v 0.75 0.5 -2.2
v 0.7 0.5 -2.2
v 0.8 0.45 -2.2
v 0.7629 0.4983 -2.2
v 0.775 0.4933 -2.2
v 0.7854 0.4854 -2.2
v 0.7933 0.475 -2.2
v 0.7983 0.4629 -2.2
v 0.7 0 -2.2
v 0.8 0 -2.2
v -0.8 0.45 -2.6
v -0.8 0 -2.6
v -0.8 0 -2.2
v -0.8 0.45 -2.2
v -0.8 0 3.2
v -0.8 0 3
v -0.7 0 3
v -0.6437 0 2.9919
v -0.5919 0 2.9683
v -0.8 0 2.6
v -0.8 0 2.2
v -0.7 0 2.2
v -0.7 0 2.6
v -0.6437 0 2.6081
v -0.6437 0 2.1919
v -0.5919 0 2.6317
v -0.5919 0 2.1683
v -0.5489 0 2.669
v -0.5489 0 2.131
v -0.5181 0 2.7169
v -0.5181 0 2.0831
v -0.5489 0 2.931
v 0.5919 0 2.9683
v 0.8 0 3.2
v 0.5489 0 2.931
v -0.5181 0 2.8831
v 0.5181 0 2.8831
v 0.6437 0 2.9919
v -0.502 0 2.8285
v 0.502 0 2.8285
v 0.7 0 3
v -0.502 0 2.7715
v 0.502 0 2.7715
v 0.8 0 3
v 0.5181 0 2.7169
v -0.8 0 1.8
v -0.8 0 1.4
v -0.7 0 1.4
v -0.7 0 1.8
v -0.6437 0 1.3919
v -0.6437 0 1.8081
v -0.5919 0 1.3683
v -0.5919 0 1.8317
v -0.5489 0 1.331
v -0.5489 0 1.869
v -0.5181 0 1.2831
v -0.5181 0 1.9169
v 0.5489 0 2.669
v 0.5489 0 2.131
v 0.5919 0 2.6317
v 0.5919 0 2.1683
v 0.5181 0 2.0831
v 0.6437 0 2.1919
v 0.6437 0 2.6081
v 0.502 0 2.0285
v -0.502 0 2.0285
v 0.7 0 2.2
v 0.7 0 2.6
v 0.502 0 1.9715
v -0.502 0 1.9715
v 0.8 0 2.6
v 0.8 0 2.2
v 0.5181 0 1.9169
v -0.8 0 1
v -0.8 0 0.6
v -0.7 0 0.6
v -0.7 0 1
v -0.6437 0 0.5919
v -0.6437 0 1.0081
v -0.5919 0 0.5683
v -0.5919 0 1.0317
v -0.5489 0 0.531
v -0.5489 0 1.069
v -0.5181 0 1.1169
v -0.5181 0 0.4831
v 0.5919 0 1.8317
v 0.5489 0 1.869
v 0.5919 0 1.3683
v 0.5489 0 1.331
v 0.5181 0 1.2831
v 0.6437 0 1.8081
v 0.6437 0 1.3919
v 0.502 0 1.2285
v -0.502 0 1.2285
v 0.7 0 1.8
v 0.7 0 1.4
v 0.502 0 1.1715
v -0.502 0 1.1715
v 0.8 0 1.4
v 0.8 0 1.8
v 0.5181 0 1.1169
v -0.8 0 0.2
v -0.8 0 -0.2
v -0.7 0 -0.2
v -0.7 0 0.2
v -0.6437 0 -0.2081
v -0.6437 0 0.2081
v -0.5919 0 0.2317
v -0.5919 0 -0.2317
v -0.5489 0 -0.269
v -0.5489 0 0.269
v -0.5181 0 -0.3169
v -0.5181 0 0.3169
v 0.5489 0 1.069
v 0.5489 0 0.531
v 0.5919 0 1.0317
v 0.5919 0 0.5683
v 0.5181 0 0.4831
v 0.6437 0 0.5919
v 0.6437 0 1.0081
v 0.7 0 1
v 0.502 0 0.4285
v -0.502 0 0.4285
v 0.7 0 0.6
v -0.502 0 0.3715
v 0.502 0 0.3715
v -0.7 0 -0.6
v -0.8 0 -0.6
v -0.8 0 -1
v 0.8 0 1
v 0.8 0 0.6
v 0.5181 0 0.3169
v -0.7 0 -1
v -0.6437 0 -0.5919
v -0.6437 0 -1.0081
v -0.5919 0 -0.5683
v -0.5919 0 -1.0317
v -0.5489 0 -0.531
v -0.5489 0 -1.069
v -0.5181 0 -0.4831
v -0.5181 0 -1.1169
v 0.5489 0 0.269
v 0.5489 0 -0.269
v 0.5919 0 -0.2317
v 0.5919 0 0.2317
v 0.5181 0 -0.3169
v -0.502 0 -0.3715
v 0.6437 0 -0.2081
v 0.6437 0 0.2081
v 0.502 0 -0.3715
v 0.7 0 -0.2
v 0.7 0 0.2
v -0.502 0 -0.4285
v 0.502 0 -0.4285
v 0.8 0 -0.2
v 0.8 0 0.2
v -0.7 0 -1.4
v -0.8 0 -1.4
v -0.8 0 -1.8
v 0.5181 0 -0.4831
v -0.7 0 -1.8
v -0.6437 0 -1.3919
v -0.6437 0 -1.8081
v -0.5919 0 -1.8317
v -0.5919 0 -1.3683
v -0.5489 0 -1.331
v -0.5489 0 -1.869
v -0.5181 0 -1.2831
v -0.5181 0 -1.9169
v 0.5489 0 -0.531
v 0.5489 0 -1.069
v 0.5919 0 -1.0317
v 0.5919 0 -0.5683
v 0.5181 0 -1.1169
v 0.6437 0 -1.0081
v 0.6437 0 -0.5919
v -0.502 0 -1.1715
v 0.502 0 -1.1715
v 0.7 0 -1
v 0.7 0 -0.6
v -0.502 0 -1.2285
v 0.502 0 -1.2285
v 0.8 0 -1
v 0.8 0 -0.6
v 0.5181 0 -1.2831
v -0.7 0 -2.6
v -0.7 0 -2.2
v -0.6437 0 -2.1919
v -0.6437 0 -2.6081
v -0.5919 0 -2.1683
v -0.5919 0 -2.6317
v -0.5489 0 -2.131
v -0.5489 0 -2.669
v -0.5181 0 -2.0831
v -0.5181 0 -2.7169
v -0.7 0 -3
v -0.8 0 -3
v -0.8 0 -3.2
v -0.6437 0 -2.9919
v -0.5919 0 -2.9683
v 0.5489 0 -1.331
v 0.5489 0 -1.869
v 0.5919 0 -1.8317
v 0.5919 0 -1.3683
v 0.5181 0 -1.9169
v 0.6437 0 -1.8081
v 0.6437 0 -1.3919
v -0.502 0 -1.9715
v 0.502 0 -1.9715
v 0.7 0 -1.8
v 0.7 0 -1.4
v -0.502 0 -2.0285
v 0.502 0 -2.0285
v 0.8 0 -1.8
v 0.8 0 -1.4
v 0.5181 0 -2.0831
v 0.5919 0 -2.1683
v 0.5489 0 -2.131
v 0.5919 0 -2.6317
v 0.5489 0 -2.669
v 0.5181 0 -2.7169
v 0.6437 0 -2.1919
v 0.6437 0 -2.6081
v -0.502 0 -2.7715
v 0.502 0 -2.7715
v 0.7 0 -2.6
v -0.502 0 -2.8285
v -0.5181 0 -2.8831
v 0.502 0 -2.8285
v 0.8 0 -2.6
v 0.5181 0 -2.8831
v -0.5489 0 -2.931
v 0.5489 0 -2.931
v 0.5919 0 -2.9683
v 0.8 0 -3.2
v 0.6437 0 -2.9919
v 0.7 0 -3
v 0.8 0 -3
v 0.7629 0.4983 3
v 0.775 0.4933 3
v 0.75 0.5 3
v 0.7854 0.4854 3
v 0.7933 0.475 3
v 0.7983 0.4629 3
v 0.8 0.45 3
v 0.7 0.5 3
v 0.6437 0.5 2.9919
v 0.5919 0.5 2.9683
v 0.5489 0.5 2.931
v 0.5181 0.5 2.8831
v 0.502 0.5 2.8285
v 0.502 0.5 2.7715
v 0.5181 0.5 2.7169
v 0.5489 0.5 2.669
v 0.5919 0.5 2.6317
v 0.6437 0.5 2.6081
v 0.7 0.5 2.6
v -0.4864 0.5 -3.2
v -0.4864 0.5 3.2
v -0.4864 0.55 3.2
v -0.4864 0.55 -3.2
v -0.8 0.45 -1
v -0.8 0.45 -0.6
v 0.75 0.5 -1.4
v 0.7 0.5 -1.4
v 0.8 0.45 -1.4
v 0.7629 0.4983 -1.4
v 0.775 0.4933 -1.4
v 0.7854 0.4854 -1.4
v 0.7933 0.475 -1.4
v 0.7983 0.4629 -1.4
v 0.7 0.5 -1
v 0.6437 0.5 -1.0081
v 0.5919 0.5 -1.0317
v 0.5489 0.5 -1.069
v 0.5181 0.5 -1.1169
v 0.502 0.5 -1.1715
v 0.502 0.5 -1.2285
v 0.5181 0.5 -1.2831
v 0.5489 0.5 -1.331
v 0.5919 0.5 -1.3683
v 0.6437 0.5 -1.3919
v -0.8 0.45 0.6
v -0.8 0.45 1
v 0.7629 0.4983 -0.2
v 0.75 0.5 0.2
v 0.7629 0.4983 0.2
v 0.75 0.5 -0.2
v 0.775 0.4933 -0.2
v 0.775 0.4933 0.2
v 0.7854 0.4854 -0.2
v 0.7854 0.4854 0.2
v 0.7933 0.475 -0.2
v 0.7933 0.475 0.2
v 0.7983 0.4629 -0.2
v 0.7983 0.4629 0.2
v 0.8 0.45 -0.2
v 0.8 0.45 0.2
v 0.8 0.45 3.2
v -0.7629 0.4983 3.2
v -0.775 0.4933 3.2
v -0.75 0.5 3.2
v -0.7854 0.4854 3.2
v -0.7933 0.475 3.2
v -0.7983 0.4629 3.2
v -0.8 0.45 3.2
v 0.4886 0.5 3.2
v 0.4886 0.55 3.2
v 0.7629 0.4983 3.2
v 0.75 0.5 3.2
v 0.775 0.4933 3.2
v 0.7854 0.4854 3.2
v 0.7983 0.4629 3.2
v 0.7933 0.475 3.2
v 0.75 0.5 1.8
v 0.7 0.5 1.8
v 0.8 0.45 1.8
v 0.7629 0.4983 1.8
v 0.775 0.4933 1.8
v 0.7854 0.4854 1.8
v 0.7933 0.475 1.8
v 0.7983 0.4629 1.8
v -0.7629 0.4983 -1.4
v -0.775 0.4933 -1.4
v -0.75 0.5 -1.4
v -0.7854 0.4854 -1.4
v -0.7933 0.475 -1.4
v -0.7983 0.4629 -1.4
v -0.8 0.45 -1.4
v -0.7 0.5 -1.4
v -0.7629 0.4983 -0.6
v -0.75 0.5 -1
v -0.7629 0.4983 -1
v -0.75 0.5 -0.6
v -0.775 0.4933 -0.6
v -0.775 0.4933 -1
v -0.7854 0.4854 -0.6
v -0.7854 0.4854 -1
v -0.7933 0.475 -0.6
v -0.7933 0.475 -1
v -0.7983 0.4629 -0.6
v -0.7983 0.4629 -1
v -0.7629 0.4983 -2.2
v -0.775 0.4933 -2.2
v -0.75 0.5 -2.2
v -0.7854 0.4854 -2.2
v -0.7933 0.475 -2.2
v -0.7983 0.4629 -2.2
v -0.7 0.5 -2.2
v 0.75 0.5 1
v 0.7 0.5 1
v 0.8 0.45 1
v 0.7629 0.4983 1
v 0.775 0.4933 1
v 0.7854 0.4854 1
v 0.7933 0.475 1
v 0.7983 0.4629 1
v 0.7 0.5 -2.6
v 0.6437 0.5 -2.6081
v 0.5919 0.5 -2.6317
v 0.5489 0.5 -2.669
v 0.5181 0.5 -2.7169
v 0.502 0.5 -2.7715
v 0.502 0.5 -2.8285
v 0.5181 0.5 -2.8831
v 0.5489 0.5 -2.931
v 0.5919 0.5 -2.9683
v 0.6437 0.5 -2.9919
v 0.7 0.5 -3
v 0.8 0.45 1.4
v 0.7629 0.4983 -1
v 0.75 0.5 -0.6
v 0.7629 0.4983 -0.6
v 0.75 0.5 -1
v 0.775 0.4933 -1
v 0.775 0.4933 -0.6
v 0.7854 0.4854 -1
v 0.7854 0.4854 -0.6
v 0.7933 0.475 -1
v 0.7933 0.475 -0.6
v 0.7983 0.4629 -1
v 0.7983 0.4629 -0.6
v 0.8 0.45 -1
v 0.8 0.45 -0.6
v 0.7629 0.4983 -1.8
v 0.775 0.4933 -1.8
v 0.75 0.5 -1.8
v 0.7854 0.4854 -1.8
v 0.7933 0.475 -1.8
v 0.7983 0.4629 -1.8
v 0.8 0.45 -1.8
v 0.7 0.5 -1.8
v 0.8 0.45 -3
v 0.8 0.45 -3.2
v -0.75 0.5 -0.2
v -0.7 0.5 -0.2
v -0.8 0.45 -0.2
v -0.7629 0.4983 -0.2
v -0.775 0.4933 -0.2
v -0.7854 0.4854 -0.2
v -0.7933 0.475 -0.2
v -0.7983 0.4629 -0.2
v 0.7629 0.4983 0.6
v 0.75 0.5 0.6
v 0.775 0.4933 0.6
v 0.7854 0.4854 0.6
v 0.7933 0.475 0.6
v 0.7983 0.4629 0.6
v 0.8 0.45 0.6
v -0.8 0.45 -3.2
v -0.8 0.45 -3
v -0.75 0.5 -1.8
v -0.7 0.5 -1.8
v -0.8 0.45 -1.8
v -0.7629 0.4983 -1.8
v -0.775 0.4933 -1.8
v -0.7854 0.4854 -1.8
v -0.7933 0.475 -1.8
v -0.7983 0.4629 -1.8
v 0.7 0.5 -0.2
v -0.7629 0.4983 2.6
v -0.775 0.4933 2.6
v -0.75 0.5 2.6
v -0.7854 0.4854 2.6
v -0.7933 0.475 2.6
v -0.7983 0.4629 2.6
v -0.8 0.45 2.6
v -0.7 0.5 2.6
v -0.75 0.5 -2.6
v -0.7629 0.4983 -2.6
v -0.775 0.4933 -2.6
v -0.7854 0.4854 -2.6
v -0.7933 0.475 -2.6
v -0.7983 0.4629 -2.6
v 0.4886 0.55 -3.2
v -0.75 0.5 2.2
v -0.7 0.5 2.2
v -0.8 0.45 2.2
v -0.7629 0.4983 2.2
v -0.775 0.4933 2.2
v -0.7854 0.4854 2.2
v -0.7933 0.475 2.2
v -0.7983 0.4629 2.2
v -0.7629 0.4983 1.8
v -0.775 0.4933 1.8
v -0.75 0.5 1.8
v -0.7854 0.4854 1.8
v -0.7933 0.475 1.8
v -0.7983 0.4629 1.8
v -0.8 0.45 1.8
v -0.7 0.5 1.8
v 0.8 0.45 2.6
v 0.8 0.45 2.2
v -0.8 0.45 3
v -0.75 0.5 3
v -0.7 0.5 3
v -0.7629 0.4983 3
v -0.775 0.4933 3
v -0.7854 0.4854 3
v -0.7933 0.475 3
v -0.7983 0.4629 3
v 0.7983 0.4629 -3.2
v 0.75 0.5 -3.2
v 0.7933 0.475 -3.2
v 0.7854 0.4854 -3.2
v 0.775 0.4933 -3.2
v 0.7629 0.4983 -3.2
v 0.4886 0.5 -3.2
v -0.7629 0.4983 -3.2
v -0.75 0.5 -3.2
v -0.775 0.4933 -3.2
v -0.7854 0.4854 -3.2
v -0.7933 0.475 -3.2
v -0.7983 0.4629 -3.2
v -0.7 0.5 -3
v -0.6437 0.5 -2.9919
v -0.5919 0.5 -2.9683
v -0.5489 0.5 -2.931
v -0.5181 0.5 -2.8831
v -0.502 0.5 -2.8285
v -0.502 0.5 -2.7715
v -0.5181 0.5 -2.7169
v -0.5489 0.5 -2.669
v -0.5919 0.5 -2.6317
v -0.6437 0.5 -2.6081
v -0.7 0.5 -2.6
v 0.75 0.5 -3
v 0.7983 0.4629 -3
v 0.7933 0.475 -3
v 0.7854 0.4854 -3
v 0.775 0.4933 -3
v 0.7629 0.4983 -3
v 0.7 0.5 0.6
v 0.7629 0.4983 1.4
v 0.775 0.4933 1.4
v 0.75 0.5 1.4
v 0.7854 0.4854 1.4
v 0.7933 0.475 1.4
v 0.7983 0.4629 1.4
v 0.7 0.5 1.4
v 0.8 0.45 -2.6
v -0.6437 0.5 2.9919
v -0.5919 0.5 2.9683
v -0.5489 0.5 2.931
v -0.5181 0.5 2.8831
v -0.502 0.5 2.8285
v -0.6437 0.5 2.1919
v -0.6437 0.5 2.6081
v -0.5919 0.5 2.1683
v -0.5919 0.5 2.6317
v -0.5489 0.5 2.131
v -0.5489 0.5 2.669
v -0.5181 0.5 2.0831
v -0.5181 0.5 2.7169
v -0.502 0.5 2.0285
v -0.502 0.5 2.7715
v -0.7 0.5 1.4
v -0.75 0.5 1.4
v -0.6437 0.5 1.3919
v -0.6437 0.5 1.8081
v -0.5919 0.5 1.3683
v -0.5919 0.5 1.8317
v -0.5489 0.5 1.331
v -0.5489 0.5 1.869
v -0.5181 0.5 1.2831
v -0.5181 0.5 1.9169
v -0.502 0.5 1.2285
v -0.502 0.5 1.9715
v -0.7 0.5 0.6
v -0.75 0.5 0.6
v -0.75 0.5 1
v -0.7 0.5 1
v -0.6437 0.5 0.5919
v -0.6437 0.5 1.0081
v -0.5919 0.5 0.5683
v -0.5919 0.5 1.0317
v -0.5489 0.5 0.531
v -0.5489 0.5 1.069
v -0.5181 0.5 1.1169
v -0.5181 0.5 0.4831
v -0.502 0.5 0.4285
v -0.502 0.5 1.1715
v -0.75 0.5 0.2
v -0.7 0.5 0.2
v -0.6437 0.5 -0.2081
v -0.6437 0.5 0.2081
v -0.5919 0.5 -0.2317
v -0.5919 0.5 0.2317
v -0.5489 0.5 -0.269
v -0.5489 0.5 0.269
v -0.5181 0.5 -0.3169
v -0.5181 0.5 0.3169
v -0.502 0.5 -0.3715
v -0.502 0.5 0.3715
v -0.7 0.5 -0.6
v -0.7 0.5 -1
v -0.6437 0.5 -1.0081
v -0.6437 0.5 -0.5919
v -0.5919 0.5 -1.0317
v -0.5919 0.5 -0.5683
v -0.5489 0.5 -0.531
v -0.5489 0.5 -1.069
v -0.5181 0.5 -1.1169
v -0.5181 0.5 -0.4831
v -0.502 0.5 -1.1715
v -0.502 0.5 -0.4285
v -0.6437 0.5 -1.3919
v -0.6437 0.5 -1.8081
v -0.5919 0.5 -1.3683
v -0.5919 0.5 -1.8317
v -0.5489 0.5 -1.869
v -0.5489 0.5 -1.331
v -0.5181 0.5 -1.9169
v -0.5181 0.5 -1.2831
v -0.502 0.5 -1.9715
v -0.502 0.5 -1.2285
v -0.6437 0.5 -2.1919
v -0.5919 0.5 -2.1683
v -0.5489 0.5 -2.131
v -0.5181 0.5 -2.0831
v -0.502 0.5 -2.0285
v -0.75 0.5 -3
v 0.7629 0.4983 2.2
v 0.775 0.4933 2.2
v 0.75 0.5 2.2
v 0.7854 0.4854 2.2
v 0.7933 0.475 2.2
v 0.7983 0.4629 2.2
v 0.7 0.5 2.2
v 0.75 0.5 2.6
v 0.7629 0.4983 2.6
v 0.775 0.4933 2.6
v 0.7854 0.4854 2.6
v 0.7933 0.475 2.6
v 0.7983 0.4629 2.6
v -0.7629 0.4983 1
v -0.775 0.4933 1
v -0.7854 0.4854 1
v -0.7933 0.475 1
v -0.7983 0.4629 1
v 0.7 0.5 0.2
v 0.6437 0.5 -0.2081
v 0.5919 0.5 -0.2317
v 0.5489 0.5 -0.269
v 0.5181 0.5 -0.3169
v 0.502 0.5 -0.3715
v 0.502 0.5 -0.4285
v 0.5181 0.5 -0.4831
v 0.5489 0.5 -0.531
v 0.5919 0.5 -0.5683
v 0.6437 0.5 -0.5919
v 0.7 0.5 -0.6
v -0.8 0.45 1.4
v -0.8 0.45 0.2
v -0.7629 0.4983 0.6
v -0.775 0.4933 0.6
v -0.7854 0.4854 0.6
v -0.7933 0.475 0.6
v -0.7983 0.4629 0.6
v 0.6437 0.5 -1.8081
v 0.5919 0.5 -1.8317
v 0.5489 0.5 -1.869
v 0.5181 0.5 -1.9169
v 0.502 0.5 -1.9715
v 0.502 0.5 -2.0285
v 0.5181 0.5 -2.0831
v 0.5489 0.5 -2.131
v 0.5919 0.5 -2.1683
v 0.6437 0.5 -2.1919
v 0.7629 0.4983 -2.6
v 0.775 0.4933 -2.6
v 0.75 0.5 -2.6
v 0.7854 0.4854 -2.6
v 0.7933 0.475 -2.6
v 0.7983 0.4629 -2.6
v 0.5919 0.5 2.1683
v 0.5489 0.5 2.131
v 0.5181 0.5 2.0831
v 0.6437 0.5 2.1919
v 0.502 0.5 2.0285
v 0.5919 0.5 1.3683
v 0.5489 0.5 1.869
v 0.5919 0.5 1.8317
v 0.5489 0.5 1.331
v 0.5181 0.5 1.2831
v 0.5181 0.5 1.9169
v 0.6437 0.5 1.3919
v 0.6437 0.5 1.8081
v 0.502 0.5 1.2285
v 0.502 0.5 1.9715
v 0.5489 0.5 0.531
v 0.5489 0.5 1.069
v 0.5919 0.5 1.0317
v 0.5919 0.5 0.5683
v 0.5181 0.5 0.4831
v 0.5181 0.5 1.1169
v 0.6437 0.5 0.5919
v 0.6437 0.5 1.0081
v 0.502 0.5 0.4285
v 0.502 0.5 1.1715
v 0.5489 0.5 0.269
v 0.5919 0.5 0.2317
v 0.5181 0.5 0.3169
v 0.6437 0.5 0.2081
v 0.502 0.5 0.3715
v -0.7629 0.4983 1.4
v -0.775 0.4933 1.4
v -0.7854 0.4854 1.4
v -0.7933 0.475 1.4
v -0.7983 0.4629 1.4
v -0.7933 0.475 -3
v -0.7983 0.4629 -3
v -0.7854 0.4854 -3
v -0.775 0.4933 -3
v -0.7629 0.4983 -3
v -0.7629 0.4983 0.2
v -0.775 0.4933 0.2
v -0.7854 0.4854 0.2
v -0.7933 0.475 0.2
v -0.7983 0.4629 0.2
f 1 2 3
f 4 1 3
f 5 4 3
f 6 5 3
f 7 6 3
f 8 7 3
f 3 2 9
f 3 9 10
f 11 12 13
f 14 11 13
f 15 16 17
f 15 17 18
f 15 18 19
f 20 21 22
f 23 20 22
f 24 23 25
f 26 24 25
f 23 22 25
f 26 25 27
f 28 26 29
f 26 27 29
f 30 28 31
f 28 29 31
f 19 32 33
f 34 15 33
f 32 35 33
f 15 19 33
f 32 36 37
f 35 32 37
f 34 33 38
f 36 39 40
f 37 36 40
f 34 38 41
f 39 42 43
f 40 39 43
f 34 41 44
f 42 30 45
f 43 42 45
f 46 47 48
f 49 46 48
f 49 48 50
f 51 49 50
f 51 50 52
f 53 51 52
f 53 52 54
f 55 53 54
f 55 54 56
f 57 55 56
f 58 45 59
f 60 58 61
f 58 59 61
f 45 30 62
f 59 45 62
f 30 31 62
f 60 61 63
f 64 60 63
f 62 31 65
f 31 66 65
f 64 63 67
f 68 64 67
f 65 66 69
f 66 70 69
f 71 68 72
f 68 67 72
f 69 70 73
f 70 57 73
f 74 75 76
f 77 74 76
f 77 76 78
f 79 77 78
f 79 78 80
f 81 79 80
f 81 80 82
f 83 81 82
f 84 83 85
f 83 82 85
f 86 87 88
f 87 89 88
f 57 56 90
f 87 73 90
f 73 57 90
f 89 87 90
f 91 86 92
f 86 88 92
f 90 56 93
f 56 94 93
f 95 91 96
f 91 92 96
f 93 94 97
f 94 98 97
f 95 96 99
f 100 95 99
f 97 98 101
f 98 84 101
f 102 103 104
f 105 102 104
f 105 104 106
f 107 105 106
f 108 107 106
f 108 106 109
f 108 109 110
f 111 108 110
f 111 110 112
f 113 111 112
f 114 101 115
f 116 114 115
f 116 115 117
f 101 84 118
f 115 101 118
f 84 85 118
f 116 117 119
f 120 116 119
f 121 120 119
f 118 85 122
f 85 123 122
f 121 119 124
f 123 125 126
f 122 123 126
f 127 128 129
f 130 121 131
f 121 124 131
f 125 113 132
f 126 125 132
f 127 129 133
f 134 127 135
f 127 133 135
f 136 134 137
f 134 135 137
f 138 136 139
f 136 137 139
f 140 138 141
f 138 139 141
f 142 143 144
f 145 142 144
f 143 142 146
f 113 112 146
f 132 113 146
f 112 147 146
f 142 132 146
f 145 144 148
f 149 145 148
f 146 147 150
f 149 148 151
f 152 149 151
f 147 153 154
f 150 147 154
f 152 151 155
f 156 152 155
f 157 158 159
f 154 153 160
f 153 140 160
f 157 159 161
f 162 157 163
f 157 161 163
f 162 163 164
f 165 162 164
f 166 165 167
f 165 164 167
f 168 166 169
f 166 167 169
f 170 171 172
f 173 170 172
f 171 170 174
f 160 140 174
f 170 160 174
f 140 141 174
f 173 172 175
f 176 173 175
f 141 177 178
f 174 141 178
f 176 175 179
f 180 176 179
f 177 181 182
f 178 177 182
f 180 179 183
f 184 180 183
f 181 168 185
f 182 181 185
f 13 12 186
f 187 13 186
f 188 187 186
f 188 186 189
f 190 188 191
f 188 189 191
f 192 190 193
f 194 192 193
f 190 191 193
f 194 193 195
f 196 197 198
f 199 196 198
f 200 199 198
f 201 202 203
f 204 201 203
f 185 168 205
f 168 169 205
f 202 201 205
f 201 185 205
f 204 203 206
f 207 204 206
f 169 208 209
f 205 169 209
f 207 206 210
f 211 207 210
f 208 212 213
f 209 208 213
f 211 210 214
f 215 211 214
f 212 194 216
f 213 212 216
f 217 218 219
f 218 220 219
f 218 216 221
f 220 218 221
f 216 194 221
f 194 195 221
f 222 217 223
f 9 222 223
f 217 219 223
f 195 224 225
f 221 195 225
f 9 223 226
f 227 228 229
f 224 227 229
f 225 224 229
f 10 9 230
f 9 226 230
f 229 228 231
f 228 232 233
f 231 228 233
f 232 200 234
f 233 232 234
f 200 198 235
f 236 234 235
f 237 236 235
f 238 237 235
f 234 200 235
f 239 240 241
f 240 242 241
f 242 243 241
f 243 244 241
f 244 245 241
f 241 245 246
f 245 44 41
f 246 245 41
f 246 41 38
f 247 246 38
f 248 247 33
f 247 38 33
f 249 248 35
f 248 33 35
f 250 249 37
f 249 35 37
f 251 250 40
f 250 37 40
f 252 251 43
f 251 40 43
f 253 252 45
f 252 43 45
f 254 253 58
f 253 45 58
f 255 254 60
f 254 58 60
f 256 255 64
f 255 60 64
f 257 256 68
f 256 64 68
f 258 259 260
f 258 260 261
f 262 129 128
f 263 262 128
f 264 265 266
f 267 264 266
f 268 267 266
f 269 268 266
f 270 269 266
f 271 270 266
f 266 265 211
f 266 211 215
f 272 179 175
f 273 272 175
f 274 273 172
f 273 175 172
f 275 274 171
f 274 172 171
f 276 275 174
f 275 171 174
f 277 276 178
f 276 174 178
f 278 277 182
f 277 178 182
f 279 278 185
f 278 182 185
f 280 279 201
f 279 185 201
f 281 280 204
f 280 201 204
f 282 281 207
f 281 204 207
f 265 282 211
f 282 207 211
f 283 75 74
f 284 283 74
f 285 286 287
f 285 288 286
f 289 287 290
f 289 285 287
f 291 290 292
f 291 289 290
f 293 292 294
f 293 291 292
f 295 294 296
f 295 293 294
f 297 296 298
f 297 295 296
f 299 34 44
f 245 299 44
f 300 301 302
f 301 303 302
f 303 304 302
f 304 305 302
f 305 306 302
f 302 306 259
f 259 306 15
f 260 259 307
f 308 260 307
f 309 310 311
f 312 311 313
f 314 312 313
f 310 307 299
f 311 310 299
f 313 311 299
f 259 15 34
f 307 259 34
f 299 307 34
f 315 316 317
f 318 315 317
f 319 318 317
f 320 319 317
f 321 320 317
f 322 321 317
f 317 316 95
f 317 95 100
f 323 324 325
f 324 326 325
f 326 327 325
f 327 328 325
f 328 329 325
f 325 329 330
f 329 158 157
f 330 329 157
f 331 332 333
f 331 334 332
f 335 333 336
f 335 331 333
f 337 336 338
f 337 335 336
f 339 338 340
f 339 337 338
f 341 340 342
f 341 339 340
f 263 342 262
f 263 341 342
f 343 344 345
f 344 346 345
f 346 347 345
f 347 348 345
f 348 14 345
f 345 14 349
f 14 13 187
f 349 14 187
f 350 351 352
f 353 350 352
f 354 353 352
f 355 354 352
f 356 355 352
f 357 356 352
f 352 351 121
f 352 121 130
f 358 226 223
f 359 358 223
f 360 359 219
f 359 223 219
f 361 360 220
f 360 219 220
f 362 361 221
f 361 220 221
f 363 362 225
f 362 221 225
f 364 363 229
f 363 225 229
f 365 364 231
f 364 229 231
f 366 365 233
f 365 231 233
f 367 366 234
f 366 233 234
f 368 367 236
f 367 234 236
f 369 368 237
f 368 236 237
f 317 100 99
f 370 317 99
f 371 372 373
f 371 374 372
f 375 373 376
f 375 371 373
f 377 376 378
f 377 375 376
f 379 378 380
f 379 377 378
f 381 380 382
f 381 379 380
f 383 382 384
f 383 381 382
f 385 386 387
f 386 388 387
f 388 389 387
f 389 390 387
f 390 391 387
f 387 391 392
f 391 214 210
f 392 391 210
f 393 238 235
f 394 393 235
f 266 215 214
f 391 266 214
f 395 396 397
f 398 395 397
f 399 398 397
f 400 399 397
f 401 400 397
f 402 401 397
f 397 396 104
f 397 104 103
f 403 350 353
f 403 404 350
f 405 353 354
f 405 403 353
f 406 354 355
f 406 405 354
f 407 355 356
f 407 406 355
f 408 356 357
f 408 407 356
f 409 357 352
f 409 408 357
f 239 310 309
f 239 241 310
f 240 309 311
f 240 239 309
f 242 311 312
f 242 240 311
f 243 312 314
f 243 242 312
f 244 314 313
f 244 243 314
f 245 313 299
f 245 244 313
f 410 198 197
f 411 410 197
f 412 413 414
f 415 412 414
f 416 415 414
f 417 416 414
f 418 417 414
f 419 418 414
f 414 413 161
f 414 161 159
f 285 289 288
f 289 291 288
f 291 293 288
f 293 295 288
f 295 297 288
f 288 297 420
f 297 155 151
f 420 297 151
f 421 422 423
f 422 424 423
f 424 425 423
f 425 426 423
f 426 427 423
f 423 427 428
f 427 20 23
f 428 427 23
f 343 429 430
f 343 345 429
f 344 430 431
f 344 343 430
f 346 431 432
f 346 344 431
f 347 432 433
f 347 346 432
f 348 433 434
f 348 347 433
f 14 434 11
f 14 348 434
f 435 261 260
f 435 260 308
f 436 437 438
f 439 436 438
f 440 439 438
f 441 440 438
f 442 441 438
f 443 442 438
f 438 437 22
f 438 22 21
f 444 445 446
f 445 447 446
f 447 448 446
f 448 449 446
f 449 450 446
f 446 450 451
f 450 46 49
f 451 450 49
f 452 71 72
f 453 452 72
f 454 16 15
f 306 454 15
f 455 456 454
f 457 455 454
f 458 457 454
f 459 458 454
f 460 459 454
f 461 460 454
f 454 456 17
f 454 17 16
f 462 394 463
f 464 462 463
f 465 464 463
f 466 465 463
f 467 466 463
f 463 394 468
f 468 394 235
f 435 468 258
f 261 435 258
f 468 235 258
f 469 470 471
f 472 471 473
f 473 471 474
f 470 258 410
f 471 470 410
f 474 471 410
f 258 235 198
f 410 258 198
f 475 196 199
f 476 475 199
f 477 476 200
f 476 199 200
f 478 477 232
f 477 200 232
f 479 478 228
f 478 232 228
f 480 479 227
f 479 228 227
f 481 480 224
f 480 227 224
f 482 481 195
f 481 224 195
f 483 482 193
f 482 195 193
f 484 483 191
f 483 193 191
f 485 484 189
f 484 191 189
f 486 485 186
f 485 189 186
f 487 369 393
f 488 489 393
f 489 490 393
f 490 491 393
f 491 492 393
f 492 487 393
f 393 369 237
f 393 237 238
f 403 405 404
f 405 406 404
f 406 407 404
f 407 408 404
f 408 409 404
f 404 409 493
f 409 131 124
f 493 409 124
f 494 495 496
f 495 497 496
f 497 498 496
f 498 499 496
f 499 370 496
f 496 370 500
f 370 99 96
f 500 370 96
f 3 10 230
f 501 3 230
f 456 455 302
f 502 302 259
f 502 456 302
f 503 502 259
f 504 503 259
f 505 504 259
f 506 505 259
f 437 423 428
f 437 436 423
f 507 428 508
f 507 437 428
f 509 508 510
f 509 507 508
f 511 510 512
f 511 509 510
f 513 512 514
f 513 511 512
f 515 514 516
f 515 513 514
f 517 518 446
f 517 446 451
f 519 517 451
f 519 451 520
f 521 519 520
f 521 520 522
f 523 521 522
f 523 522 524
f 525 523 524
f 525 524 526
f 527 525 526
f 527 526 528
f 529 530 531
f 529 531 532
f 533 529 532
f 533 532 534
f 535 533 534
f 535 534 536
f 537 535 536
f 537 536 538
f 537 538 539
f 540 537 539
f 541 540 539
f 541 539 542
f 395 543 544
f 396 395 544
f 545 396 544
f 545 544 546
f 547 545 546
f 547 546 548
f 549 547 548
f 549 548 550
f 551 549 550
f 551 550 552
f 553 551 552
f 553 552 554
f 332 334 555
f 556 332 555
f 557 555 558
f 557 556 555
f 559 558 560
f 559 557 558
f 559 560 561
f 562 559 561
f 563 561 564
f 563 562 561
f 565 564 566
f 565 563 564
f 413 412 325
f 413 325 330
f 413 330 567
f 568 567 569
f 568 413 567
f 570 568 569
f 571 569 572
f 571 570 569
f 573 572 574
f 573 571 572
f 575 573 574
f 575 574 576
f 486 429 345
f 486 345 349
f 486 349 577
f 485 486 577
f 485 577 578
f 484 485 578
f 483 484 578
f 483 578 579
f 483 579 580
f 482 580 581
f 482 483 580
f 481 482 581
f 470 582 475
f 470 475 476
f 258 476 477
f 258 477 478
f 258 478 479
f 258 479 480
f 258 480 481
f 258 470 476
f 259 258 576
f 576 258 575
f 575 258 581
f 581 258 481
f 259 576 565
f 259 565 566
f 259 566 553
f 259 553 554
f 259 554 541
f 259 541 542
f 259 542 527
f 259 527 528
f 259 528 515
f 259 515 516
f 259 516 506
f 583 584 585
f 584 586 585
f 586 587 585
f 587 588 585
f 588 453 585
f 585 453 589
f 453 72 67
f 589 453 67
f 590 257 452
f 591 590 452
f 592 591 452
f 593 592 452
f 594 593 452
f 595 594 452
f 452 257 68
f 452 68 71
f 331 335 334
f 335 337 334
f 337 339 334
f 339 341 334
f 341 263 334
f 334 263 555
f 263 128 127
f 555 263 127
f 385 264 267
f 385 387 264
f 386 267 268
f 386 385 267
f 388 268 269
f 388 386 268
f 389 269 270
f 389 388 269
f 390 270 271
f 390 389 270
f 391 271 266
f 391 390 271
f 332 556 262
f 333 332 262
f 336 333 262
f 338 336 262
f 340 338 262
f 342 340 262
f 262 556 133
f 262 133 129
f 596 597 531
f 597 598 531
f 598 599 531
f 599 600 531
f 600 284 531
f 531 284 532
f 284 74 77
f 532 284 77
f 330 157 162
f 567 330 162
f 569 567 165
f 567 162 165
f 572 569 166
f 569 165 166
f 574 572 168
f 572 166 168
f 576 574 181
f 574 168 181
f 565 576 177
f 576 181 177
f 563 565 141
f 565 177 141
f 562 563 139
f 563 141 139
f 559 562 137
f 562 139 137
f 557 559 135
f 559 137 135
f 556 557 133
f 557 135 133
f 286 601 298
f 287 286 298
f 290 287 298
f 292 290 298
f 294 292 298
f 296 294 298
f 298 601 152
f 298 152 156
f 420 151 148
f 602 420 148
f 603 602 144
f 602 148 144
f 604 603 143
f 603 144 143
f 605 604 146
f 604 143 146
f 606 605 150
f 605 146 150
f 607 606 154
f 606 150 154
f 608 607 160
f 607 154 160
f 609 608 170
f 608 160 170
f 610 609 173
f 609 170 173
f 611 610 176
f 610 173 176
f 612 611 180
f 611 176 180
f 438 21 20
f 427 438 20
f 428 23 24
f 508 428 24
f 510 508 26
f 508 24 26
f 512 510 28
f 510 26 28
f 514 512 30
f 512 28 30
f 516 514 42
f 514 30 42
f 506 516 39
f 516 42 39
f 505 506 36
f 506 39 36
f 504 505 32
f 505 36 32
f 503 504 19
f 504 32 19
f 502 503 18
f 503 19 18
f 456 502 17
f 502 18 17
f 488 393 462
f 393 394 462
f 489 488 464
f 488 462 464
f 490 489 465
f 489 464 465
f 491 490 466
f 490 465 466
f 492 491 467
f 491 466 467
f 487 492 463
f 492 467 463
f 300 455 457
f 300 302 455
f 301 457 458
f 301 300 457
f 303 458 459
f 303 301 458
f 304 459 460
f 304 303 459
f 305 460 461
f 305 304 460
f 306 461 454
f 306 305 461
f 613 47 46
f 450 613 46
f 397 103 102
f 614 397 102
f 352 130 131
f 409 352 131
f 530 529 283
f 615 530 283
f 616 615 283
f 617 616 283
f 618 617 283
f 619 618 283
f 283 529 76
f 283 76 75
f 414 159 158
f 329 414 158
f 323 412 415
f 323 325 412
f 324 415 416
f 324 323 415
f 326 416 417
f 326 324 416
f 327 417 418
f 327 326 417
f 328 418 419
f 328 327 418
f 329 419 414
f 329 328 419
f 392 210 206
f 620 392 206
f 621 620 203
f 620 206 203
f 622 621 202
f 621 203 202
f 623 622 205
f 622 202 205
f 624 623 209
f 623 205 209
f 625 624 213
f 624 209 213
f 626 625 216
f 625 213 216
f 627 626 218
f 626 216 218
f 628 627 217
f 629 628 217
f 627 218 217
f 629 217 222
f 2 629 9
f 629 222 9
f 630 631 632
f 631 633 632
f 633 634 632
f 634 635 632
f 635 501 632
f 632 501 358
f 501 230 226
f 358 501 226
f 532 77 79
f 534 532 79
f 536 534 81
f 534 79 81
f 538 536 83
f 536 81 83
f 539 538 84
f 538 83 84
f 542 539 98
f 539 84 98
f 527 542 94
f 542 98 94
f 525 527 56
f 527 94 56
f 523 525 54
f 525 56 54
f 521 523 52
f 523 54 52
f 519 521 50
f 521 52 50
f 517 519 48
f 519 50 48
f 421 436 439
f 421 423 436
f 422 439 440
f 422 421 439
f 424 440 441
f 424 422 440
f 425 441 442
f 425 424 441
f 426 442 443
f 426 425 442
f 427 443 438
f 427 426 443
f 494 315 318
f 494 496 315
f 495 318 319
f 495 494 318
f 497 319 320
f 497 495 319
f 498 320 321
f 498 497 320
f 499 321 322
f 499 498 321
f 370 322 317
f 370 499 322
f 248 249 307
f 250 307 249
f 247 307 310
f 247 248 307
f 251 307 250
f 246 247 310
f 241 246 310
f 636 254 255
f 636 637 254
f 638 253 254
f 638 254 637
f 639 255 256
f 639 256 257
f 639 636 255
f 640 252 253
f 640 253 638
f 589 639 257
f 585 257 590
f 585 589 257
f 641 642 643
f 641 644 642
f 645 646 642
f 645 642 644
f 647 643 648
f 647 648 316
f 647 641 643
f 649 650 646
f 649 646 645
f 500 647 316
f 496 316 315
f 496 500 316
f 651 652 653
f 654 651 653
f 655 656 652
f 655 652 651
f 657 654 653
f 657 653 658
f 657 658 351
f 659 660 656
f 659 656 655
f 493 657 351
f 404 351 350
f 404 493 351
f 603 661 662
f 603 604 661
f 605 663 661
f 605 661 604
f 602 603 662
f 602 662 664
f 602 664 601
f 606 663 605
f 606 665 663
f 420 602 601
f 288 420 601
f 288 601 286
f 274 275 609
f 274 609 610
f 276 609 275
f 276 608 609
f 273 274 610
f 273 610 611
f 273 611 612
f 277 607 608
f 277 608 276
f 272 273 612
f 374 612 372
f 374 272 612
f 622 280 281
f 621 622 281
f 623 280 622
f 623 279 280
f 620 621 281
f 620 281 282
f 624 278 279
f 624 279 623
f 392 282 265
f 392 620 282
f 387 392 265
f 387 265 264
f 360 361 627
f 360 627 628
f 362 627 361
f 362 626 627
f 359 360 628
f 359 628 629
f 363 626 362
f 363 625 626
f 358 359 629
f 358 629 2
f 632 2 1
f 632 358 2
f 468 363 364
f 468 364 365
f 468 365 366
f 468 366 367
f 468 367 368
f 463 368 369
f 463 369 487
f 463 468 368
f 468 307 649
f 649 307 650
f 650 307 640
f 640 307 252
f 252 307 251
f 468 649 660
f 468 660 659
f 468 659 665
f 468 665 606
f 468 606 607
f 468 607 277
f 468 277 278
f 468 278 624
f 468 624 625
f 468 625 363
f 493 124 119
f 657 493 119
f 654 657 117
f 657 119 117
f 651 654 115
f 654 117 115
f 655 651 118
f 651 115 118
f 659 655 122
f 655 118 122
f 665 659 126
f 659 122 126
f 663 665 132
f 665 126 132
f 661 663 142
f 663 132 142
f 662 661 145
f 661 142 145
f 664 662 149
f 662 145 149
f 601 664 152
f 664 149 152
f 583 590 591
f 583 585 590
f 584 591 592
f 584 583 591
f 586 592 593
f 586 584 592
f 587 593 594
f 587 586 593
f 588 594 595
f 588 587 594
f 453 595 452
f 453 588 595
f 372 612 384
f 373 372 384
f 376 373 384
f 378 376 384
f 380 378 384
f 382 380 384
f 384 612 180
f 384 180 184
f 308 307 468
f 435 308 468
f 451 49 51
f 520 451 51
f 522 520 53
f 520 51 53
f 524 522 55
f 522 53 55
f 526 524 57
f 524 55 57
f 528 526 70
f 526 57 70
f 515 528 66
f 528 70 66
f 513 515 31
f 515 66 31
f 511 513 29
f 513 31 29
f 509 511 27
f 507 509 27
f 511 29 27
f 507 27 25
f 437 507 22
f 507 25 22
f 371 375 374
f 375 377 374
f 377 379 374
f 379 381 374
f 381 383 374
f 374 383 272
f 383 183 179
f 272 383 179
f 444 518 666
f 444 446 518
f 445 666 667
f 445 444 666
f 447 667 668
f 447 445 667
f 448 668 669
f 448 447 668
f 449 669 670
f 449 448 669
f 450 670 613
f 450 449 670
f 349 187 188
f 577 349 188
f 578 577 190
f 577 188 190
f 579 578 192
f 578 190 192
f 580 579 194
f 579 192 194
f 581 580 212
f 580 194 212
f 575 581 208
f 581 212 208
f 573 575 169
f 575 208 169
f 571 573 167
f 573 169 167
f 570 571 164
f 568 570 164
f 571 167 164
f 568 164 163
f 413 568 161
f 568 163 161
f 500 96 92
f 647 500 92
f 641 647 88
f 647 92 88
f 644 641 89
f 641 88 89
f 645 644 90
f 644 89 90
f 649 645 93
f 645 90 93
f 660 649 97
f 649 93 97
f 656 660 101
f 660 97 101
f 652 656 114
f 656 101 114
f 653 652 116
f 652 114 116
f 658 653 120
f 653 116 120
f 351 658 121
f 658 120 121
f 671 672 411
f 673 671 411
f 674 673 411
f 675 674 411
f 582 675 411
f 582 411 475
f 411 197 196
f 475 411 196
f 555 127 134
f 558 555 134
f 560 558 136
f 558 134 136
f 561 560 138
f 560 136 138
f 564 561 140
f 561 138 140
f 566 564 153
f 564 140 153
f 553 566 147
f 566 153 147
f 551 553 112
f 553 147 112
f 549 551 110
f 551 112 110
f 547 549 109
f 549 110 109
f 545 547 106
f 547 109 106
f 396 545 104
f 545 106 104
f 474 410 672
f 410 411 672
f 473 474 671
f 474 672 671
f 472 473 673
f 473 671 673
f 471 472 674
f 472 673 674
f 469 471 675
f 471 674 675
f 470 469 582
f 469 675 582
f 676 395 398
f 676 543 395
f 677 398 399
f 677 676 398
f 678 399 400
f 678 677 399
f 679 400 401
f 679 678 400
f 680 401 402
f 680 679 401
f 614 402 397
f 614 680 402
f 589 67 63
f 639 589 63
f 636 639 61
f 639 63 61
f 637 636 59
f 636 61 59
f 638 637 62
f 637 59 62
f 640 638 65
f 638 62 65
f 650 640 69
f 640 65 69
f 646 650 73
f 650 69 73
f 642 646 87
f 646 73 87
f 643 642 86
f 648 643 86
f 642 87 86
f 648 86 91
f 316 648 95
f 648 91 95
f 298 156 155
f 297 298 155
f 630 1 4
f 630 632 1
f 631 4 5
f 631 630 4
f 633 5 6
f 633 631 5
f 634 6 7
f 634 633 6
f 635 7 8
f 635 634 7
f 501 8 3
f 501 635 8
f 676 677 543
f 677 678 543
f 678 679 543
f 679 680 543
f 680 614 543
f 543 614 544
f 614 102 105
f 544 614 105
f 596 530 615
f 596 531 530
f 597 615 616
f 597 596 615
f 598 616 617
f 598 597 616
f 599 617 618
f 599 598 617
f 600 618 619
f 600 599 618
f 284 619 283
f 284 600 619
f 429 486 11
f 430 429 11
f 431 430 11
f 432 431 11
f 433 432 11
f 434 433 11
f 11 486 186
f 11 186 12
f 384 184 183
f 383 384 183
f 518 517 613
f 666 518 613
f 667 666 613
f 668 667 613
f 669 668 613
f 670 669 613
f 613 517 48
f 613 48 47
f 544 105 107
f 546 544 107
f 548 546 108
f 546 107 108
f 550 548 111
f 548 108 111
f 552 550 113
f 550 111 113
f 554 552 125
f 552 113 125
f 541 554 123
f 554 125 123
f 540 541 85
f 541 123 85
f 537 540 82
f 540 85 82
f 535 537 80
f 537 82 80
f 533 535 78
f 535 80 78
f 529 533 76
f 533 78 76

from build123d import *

# Parameters (mm, degrees)
BOSS_EXTRUDE1_DEPTH = 0.5
SKETCH2_W           = 0.974965632
SKETCH2_H           = 6.4
BOSS_EXTRUDE2_DEPTH = 0.05
FILLET2_R           = 0.05


with BuildPart() as part:
    # Sketch1 → Boss-Extrude1 (new body)
    with BuildSketch(Plane(origin=(0, 0, 0), x_dir=(1, 0, 0), z_dir=(0, 1, 0))):
        with BuildLine():
            Line((-0.8, 3.2), (-0.8, 3))
            Line((-0.8, 3), (-0.7, 3))
            ThreePointArc((-0.7, 3), (-0.5, 2.8), (-0.7, 2.6))
            Line((-0.7, 2.6), (-0.8, 2.6))
            Line((-0.8, 2.6), (-0.8, 2.2))
            Line((-0.8, 2.2), (-0.7, 2.2))
            ThreePointArc((-0.7, 2.2), (-0.5, 2), (-0.7, 1.8))
            Line((-0.7, 1.8), (-0.8, 1.8))
            Line((-0.8, 1.8), (-0.8, 1.4))
            Line((-0.8, 1.4), (-0.7, 1.4))
            ThreePointArc((-0.7, 1.4), (-0.5, 1.2), (-0.7, 1))
            Line((-0.7, 1), (-0.8, 1))
            Line((-0.8, 1), (-0.8, 0.6))
            Line((-0.8, 0.6), (-0.7, 0.6))
            ThreePointArc((-0.7, 0.6), (-0.5, 0.4), (-0.7, 0.2))
            Line((-0.7, 0.2), (-0.8, 0.2))
            Line((-0.8, 0.2), (-0.8, -0.2))
            Line((-0.8, -0.2), (-0.7, -0.2))
            ThreePointArc((-0.7, -0.2), (-0.5, -0.4), (-0.7, -0.6))
            Line((-0.7, -0.6), (-0.8, -0.6))
            Line((-0.8, -0.6), (-0.8, -1))
            Line((-0.8, -1), (-0.7, -1))
            ThreePointArc((-0.7, -1), (-0.5, -1.2), (-0.7, -1.4))
            Line((-0.7, -1.4), (-0.8, -1.4))
            Line((-0.8, -1.4), (-0.8, -1.8))
            Line((-0.8, -1.8), (-0.7, -1.8))
            ThreePointArc((-0.7, -1.8), (-0.5, -2), (-0.7, -2.2))
            Line((-0.7, -2.2), (-0.8, -2.2))
            Line((-0.8, -2.2), (-0.8, -2.6))
            Line((-0.8, -2.6), (-0.7, -2.6))
            ThreePointArc((-0.7, -2.6), (-0.5, -2.8), (-0.7, -3))
            Line((-0.7, -3), (-0.8, -3))
            Line((-0.8, -3), (-0.8, -3.2))
            Line((-0.8, -3.2), (0.8, -3.2))
            Line((0.8, -3.2), (0.8, -3))
            Line((0.8, -3), (0.7, -3))
            ThreePointArc((0.7, -3), (0.5, -2.8), (0.7, -2.6))
            Line((0.7, -2.6), (0.8, -2.6))
            Line((0.8, -2.6), (0.8, -2.2))
            Line((0.8, -2.2), (0.7, -2.2))
            ThreePointArc((0.7, -2.2), (0.5, -2), (0.7, -1.8))
            Line((0.7, -1.8), (0.8, -1.8))
            Line((0.8, -1.8), (0.8, -1.4))
            Line((0.8, -1.4), (0.7, -1.4))
            ThreePointArc((0.7, -1.4), (0.5, -1.2), (0.7, -1))
            Line((0.7, -1), (0.8, -1))
            Line((0.8, -1), (0.8, -0.6))
            Line((0.8, -0.6), (0.7, -0.6))
            ThreePointArc((0.7, -0.6), (0.5, -0.4), (0.7, -0.2))
            Line((0.7, -0.2), (0.8, -0.2))
            Line((0.8, -0.2), (0.8, 0.2))
            Line((0.8, 0.2), (0.7, 0.2))
            ThreePointArc((0.7, 0.2), (0.5, 0.4), (0.7, 0.6))
            Line((0.7, 0.6), (0.8, 0.6))
            Line((0.8, 0.6), (0.8, 1))
            Line((0.8, 1), (0.7, 1))
            ThreePointArc((0.7, 1), (0.5, 1.2), (0.7, 1.4))
            Line((0.7, 1.4), (0.8, 1.4))
            Line((0.8, 1.4), (0.8, 1.8))
            Line((0.8, 1.8), (0.7, 1.8))
            ThreePointArc((0.7, 1.8), (0.5, 2), (0.7, 2.2))
            Line((0.7, 2.2), (0.8, 2.2))
            Line((0.8, 2.2), (0.8, 2.6))
            Line((0.8, 2.6), (0.7, 2.6))
            ThreePointArc((0.7, 2.6), (0.5, 2.8), (0.7, 3))
            Line((0.7, 3), (0.8, 3))
            Line((0.8, 3), (0.8, 3.2))
            Line((0.8, 3.2), (-0.8, 3.2))
        make_face()
    extrude(amount=BOSS_EXTRUDE1_DEPTH)

    # Sketch2 → Boss-Extrude2 (add)
    with BuildSketch(Plane(origin=(0, 0.5, 0), x_dir=(1, 0, 0), z_dir=(0, 1, 0))):
        with Locations((0.001088626, 0)):
            Rectangle(SKETCH2_W, SKETCH2_H)
    extrude(amount=BOSS_EXTRUDE2_DEPTH)

    # Fillet2
    fillet2_edges = [part.edges().sort_by_distance(p)[0] for p in [
        (-0.8, 0.5, 1.6),
        (-0.8, 0.5, 2.4),
        (-0.8, 0.5, 3.1),
        (0.8, 0.5, 3.1),
        (0.8, 0.5, 2.4),
        (0.8, 0.5, 1.6),
        (0.8, 0.5, 0.8),
        (0.8, 0.5, 0),
        (0.8, 0.5, -0.8),
        (0.8, 0.5, -1.6),
        (-0.8, 0.5, -2.4),
        (0.8, 0.5, -2.4),
        (0.8, 0.5, -3.1),
        (-0.8, 0.5, -1.6),
        (-0.8, 0.5, -0.8),
        (-0.8, 0.5, 0),
        (-0.8, 0.5, 0.8),
        (-0.8, 0.5, -3.1),
    ]]
    fillet(fillet2_edges, radius=FILLET2_R)


solid = part.part
